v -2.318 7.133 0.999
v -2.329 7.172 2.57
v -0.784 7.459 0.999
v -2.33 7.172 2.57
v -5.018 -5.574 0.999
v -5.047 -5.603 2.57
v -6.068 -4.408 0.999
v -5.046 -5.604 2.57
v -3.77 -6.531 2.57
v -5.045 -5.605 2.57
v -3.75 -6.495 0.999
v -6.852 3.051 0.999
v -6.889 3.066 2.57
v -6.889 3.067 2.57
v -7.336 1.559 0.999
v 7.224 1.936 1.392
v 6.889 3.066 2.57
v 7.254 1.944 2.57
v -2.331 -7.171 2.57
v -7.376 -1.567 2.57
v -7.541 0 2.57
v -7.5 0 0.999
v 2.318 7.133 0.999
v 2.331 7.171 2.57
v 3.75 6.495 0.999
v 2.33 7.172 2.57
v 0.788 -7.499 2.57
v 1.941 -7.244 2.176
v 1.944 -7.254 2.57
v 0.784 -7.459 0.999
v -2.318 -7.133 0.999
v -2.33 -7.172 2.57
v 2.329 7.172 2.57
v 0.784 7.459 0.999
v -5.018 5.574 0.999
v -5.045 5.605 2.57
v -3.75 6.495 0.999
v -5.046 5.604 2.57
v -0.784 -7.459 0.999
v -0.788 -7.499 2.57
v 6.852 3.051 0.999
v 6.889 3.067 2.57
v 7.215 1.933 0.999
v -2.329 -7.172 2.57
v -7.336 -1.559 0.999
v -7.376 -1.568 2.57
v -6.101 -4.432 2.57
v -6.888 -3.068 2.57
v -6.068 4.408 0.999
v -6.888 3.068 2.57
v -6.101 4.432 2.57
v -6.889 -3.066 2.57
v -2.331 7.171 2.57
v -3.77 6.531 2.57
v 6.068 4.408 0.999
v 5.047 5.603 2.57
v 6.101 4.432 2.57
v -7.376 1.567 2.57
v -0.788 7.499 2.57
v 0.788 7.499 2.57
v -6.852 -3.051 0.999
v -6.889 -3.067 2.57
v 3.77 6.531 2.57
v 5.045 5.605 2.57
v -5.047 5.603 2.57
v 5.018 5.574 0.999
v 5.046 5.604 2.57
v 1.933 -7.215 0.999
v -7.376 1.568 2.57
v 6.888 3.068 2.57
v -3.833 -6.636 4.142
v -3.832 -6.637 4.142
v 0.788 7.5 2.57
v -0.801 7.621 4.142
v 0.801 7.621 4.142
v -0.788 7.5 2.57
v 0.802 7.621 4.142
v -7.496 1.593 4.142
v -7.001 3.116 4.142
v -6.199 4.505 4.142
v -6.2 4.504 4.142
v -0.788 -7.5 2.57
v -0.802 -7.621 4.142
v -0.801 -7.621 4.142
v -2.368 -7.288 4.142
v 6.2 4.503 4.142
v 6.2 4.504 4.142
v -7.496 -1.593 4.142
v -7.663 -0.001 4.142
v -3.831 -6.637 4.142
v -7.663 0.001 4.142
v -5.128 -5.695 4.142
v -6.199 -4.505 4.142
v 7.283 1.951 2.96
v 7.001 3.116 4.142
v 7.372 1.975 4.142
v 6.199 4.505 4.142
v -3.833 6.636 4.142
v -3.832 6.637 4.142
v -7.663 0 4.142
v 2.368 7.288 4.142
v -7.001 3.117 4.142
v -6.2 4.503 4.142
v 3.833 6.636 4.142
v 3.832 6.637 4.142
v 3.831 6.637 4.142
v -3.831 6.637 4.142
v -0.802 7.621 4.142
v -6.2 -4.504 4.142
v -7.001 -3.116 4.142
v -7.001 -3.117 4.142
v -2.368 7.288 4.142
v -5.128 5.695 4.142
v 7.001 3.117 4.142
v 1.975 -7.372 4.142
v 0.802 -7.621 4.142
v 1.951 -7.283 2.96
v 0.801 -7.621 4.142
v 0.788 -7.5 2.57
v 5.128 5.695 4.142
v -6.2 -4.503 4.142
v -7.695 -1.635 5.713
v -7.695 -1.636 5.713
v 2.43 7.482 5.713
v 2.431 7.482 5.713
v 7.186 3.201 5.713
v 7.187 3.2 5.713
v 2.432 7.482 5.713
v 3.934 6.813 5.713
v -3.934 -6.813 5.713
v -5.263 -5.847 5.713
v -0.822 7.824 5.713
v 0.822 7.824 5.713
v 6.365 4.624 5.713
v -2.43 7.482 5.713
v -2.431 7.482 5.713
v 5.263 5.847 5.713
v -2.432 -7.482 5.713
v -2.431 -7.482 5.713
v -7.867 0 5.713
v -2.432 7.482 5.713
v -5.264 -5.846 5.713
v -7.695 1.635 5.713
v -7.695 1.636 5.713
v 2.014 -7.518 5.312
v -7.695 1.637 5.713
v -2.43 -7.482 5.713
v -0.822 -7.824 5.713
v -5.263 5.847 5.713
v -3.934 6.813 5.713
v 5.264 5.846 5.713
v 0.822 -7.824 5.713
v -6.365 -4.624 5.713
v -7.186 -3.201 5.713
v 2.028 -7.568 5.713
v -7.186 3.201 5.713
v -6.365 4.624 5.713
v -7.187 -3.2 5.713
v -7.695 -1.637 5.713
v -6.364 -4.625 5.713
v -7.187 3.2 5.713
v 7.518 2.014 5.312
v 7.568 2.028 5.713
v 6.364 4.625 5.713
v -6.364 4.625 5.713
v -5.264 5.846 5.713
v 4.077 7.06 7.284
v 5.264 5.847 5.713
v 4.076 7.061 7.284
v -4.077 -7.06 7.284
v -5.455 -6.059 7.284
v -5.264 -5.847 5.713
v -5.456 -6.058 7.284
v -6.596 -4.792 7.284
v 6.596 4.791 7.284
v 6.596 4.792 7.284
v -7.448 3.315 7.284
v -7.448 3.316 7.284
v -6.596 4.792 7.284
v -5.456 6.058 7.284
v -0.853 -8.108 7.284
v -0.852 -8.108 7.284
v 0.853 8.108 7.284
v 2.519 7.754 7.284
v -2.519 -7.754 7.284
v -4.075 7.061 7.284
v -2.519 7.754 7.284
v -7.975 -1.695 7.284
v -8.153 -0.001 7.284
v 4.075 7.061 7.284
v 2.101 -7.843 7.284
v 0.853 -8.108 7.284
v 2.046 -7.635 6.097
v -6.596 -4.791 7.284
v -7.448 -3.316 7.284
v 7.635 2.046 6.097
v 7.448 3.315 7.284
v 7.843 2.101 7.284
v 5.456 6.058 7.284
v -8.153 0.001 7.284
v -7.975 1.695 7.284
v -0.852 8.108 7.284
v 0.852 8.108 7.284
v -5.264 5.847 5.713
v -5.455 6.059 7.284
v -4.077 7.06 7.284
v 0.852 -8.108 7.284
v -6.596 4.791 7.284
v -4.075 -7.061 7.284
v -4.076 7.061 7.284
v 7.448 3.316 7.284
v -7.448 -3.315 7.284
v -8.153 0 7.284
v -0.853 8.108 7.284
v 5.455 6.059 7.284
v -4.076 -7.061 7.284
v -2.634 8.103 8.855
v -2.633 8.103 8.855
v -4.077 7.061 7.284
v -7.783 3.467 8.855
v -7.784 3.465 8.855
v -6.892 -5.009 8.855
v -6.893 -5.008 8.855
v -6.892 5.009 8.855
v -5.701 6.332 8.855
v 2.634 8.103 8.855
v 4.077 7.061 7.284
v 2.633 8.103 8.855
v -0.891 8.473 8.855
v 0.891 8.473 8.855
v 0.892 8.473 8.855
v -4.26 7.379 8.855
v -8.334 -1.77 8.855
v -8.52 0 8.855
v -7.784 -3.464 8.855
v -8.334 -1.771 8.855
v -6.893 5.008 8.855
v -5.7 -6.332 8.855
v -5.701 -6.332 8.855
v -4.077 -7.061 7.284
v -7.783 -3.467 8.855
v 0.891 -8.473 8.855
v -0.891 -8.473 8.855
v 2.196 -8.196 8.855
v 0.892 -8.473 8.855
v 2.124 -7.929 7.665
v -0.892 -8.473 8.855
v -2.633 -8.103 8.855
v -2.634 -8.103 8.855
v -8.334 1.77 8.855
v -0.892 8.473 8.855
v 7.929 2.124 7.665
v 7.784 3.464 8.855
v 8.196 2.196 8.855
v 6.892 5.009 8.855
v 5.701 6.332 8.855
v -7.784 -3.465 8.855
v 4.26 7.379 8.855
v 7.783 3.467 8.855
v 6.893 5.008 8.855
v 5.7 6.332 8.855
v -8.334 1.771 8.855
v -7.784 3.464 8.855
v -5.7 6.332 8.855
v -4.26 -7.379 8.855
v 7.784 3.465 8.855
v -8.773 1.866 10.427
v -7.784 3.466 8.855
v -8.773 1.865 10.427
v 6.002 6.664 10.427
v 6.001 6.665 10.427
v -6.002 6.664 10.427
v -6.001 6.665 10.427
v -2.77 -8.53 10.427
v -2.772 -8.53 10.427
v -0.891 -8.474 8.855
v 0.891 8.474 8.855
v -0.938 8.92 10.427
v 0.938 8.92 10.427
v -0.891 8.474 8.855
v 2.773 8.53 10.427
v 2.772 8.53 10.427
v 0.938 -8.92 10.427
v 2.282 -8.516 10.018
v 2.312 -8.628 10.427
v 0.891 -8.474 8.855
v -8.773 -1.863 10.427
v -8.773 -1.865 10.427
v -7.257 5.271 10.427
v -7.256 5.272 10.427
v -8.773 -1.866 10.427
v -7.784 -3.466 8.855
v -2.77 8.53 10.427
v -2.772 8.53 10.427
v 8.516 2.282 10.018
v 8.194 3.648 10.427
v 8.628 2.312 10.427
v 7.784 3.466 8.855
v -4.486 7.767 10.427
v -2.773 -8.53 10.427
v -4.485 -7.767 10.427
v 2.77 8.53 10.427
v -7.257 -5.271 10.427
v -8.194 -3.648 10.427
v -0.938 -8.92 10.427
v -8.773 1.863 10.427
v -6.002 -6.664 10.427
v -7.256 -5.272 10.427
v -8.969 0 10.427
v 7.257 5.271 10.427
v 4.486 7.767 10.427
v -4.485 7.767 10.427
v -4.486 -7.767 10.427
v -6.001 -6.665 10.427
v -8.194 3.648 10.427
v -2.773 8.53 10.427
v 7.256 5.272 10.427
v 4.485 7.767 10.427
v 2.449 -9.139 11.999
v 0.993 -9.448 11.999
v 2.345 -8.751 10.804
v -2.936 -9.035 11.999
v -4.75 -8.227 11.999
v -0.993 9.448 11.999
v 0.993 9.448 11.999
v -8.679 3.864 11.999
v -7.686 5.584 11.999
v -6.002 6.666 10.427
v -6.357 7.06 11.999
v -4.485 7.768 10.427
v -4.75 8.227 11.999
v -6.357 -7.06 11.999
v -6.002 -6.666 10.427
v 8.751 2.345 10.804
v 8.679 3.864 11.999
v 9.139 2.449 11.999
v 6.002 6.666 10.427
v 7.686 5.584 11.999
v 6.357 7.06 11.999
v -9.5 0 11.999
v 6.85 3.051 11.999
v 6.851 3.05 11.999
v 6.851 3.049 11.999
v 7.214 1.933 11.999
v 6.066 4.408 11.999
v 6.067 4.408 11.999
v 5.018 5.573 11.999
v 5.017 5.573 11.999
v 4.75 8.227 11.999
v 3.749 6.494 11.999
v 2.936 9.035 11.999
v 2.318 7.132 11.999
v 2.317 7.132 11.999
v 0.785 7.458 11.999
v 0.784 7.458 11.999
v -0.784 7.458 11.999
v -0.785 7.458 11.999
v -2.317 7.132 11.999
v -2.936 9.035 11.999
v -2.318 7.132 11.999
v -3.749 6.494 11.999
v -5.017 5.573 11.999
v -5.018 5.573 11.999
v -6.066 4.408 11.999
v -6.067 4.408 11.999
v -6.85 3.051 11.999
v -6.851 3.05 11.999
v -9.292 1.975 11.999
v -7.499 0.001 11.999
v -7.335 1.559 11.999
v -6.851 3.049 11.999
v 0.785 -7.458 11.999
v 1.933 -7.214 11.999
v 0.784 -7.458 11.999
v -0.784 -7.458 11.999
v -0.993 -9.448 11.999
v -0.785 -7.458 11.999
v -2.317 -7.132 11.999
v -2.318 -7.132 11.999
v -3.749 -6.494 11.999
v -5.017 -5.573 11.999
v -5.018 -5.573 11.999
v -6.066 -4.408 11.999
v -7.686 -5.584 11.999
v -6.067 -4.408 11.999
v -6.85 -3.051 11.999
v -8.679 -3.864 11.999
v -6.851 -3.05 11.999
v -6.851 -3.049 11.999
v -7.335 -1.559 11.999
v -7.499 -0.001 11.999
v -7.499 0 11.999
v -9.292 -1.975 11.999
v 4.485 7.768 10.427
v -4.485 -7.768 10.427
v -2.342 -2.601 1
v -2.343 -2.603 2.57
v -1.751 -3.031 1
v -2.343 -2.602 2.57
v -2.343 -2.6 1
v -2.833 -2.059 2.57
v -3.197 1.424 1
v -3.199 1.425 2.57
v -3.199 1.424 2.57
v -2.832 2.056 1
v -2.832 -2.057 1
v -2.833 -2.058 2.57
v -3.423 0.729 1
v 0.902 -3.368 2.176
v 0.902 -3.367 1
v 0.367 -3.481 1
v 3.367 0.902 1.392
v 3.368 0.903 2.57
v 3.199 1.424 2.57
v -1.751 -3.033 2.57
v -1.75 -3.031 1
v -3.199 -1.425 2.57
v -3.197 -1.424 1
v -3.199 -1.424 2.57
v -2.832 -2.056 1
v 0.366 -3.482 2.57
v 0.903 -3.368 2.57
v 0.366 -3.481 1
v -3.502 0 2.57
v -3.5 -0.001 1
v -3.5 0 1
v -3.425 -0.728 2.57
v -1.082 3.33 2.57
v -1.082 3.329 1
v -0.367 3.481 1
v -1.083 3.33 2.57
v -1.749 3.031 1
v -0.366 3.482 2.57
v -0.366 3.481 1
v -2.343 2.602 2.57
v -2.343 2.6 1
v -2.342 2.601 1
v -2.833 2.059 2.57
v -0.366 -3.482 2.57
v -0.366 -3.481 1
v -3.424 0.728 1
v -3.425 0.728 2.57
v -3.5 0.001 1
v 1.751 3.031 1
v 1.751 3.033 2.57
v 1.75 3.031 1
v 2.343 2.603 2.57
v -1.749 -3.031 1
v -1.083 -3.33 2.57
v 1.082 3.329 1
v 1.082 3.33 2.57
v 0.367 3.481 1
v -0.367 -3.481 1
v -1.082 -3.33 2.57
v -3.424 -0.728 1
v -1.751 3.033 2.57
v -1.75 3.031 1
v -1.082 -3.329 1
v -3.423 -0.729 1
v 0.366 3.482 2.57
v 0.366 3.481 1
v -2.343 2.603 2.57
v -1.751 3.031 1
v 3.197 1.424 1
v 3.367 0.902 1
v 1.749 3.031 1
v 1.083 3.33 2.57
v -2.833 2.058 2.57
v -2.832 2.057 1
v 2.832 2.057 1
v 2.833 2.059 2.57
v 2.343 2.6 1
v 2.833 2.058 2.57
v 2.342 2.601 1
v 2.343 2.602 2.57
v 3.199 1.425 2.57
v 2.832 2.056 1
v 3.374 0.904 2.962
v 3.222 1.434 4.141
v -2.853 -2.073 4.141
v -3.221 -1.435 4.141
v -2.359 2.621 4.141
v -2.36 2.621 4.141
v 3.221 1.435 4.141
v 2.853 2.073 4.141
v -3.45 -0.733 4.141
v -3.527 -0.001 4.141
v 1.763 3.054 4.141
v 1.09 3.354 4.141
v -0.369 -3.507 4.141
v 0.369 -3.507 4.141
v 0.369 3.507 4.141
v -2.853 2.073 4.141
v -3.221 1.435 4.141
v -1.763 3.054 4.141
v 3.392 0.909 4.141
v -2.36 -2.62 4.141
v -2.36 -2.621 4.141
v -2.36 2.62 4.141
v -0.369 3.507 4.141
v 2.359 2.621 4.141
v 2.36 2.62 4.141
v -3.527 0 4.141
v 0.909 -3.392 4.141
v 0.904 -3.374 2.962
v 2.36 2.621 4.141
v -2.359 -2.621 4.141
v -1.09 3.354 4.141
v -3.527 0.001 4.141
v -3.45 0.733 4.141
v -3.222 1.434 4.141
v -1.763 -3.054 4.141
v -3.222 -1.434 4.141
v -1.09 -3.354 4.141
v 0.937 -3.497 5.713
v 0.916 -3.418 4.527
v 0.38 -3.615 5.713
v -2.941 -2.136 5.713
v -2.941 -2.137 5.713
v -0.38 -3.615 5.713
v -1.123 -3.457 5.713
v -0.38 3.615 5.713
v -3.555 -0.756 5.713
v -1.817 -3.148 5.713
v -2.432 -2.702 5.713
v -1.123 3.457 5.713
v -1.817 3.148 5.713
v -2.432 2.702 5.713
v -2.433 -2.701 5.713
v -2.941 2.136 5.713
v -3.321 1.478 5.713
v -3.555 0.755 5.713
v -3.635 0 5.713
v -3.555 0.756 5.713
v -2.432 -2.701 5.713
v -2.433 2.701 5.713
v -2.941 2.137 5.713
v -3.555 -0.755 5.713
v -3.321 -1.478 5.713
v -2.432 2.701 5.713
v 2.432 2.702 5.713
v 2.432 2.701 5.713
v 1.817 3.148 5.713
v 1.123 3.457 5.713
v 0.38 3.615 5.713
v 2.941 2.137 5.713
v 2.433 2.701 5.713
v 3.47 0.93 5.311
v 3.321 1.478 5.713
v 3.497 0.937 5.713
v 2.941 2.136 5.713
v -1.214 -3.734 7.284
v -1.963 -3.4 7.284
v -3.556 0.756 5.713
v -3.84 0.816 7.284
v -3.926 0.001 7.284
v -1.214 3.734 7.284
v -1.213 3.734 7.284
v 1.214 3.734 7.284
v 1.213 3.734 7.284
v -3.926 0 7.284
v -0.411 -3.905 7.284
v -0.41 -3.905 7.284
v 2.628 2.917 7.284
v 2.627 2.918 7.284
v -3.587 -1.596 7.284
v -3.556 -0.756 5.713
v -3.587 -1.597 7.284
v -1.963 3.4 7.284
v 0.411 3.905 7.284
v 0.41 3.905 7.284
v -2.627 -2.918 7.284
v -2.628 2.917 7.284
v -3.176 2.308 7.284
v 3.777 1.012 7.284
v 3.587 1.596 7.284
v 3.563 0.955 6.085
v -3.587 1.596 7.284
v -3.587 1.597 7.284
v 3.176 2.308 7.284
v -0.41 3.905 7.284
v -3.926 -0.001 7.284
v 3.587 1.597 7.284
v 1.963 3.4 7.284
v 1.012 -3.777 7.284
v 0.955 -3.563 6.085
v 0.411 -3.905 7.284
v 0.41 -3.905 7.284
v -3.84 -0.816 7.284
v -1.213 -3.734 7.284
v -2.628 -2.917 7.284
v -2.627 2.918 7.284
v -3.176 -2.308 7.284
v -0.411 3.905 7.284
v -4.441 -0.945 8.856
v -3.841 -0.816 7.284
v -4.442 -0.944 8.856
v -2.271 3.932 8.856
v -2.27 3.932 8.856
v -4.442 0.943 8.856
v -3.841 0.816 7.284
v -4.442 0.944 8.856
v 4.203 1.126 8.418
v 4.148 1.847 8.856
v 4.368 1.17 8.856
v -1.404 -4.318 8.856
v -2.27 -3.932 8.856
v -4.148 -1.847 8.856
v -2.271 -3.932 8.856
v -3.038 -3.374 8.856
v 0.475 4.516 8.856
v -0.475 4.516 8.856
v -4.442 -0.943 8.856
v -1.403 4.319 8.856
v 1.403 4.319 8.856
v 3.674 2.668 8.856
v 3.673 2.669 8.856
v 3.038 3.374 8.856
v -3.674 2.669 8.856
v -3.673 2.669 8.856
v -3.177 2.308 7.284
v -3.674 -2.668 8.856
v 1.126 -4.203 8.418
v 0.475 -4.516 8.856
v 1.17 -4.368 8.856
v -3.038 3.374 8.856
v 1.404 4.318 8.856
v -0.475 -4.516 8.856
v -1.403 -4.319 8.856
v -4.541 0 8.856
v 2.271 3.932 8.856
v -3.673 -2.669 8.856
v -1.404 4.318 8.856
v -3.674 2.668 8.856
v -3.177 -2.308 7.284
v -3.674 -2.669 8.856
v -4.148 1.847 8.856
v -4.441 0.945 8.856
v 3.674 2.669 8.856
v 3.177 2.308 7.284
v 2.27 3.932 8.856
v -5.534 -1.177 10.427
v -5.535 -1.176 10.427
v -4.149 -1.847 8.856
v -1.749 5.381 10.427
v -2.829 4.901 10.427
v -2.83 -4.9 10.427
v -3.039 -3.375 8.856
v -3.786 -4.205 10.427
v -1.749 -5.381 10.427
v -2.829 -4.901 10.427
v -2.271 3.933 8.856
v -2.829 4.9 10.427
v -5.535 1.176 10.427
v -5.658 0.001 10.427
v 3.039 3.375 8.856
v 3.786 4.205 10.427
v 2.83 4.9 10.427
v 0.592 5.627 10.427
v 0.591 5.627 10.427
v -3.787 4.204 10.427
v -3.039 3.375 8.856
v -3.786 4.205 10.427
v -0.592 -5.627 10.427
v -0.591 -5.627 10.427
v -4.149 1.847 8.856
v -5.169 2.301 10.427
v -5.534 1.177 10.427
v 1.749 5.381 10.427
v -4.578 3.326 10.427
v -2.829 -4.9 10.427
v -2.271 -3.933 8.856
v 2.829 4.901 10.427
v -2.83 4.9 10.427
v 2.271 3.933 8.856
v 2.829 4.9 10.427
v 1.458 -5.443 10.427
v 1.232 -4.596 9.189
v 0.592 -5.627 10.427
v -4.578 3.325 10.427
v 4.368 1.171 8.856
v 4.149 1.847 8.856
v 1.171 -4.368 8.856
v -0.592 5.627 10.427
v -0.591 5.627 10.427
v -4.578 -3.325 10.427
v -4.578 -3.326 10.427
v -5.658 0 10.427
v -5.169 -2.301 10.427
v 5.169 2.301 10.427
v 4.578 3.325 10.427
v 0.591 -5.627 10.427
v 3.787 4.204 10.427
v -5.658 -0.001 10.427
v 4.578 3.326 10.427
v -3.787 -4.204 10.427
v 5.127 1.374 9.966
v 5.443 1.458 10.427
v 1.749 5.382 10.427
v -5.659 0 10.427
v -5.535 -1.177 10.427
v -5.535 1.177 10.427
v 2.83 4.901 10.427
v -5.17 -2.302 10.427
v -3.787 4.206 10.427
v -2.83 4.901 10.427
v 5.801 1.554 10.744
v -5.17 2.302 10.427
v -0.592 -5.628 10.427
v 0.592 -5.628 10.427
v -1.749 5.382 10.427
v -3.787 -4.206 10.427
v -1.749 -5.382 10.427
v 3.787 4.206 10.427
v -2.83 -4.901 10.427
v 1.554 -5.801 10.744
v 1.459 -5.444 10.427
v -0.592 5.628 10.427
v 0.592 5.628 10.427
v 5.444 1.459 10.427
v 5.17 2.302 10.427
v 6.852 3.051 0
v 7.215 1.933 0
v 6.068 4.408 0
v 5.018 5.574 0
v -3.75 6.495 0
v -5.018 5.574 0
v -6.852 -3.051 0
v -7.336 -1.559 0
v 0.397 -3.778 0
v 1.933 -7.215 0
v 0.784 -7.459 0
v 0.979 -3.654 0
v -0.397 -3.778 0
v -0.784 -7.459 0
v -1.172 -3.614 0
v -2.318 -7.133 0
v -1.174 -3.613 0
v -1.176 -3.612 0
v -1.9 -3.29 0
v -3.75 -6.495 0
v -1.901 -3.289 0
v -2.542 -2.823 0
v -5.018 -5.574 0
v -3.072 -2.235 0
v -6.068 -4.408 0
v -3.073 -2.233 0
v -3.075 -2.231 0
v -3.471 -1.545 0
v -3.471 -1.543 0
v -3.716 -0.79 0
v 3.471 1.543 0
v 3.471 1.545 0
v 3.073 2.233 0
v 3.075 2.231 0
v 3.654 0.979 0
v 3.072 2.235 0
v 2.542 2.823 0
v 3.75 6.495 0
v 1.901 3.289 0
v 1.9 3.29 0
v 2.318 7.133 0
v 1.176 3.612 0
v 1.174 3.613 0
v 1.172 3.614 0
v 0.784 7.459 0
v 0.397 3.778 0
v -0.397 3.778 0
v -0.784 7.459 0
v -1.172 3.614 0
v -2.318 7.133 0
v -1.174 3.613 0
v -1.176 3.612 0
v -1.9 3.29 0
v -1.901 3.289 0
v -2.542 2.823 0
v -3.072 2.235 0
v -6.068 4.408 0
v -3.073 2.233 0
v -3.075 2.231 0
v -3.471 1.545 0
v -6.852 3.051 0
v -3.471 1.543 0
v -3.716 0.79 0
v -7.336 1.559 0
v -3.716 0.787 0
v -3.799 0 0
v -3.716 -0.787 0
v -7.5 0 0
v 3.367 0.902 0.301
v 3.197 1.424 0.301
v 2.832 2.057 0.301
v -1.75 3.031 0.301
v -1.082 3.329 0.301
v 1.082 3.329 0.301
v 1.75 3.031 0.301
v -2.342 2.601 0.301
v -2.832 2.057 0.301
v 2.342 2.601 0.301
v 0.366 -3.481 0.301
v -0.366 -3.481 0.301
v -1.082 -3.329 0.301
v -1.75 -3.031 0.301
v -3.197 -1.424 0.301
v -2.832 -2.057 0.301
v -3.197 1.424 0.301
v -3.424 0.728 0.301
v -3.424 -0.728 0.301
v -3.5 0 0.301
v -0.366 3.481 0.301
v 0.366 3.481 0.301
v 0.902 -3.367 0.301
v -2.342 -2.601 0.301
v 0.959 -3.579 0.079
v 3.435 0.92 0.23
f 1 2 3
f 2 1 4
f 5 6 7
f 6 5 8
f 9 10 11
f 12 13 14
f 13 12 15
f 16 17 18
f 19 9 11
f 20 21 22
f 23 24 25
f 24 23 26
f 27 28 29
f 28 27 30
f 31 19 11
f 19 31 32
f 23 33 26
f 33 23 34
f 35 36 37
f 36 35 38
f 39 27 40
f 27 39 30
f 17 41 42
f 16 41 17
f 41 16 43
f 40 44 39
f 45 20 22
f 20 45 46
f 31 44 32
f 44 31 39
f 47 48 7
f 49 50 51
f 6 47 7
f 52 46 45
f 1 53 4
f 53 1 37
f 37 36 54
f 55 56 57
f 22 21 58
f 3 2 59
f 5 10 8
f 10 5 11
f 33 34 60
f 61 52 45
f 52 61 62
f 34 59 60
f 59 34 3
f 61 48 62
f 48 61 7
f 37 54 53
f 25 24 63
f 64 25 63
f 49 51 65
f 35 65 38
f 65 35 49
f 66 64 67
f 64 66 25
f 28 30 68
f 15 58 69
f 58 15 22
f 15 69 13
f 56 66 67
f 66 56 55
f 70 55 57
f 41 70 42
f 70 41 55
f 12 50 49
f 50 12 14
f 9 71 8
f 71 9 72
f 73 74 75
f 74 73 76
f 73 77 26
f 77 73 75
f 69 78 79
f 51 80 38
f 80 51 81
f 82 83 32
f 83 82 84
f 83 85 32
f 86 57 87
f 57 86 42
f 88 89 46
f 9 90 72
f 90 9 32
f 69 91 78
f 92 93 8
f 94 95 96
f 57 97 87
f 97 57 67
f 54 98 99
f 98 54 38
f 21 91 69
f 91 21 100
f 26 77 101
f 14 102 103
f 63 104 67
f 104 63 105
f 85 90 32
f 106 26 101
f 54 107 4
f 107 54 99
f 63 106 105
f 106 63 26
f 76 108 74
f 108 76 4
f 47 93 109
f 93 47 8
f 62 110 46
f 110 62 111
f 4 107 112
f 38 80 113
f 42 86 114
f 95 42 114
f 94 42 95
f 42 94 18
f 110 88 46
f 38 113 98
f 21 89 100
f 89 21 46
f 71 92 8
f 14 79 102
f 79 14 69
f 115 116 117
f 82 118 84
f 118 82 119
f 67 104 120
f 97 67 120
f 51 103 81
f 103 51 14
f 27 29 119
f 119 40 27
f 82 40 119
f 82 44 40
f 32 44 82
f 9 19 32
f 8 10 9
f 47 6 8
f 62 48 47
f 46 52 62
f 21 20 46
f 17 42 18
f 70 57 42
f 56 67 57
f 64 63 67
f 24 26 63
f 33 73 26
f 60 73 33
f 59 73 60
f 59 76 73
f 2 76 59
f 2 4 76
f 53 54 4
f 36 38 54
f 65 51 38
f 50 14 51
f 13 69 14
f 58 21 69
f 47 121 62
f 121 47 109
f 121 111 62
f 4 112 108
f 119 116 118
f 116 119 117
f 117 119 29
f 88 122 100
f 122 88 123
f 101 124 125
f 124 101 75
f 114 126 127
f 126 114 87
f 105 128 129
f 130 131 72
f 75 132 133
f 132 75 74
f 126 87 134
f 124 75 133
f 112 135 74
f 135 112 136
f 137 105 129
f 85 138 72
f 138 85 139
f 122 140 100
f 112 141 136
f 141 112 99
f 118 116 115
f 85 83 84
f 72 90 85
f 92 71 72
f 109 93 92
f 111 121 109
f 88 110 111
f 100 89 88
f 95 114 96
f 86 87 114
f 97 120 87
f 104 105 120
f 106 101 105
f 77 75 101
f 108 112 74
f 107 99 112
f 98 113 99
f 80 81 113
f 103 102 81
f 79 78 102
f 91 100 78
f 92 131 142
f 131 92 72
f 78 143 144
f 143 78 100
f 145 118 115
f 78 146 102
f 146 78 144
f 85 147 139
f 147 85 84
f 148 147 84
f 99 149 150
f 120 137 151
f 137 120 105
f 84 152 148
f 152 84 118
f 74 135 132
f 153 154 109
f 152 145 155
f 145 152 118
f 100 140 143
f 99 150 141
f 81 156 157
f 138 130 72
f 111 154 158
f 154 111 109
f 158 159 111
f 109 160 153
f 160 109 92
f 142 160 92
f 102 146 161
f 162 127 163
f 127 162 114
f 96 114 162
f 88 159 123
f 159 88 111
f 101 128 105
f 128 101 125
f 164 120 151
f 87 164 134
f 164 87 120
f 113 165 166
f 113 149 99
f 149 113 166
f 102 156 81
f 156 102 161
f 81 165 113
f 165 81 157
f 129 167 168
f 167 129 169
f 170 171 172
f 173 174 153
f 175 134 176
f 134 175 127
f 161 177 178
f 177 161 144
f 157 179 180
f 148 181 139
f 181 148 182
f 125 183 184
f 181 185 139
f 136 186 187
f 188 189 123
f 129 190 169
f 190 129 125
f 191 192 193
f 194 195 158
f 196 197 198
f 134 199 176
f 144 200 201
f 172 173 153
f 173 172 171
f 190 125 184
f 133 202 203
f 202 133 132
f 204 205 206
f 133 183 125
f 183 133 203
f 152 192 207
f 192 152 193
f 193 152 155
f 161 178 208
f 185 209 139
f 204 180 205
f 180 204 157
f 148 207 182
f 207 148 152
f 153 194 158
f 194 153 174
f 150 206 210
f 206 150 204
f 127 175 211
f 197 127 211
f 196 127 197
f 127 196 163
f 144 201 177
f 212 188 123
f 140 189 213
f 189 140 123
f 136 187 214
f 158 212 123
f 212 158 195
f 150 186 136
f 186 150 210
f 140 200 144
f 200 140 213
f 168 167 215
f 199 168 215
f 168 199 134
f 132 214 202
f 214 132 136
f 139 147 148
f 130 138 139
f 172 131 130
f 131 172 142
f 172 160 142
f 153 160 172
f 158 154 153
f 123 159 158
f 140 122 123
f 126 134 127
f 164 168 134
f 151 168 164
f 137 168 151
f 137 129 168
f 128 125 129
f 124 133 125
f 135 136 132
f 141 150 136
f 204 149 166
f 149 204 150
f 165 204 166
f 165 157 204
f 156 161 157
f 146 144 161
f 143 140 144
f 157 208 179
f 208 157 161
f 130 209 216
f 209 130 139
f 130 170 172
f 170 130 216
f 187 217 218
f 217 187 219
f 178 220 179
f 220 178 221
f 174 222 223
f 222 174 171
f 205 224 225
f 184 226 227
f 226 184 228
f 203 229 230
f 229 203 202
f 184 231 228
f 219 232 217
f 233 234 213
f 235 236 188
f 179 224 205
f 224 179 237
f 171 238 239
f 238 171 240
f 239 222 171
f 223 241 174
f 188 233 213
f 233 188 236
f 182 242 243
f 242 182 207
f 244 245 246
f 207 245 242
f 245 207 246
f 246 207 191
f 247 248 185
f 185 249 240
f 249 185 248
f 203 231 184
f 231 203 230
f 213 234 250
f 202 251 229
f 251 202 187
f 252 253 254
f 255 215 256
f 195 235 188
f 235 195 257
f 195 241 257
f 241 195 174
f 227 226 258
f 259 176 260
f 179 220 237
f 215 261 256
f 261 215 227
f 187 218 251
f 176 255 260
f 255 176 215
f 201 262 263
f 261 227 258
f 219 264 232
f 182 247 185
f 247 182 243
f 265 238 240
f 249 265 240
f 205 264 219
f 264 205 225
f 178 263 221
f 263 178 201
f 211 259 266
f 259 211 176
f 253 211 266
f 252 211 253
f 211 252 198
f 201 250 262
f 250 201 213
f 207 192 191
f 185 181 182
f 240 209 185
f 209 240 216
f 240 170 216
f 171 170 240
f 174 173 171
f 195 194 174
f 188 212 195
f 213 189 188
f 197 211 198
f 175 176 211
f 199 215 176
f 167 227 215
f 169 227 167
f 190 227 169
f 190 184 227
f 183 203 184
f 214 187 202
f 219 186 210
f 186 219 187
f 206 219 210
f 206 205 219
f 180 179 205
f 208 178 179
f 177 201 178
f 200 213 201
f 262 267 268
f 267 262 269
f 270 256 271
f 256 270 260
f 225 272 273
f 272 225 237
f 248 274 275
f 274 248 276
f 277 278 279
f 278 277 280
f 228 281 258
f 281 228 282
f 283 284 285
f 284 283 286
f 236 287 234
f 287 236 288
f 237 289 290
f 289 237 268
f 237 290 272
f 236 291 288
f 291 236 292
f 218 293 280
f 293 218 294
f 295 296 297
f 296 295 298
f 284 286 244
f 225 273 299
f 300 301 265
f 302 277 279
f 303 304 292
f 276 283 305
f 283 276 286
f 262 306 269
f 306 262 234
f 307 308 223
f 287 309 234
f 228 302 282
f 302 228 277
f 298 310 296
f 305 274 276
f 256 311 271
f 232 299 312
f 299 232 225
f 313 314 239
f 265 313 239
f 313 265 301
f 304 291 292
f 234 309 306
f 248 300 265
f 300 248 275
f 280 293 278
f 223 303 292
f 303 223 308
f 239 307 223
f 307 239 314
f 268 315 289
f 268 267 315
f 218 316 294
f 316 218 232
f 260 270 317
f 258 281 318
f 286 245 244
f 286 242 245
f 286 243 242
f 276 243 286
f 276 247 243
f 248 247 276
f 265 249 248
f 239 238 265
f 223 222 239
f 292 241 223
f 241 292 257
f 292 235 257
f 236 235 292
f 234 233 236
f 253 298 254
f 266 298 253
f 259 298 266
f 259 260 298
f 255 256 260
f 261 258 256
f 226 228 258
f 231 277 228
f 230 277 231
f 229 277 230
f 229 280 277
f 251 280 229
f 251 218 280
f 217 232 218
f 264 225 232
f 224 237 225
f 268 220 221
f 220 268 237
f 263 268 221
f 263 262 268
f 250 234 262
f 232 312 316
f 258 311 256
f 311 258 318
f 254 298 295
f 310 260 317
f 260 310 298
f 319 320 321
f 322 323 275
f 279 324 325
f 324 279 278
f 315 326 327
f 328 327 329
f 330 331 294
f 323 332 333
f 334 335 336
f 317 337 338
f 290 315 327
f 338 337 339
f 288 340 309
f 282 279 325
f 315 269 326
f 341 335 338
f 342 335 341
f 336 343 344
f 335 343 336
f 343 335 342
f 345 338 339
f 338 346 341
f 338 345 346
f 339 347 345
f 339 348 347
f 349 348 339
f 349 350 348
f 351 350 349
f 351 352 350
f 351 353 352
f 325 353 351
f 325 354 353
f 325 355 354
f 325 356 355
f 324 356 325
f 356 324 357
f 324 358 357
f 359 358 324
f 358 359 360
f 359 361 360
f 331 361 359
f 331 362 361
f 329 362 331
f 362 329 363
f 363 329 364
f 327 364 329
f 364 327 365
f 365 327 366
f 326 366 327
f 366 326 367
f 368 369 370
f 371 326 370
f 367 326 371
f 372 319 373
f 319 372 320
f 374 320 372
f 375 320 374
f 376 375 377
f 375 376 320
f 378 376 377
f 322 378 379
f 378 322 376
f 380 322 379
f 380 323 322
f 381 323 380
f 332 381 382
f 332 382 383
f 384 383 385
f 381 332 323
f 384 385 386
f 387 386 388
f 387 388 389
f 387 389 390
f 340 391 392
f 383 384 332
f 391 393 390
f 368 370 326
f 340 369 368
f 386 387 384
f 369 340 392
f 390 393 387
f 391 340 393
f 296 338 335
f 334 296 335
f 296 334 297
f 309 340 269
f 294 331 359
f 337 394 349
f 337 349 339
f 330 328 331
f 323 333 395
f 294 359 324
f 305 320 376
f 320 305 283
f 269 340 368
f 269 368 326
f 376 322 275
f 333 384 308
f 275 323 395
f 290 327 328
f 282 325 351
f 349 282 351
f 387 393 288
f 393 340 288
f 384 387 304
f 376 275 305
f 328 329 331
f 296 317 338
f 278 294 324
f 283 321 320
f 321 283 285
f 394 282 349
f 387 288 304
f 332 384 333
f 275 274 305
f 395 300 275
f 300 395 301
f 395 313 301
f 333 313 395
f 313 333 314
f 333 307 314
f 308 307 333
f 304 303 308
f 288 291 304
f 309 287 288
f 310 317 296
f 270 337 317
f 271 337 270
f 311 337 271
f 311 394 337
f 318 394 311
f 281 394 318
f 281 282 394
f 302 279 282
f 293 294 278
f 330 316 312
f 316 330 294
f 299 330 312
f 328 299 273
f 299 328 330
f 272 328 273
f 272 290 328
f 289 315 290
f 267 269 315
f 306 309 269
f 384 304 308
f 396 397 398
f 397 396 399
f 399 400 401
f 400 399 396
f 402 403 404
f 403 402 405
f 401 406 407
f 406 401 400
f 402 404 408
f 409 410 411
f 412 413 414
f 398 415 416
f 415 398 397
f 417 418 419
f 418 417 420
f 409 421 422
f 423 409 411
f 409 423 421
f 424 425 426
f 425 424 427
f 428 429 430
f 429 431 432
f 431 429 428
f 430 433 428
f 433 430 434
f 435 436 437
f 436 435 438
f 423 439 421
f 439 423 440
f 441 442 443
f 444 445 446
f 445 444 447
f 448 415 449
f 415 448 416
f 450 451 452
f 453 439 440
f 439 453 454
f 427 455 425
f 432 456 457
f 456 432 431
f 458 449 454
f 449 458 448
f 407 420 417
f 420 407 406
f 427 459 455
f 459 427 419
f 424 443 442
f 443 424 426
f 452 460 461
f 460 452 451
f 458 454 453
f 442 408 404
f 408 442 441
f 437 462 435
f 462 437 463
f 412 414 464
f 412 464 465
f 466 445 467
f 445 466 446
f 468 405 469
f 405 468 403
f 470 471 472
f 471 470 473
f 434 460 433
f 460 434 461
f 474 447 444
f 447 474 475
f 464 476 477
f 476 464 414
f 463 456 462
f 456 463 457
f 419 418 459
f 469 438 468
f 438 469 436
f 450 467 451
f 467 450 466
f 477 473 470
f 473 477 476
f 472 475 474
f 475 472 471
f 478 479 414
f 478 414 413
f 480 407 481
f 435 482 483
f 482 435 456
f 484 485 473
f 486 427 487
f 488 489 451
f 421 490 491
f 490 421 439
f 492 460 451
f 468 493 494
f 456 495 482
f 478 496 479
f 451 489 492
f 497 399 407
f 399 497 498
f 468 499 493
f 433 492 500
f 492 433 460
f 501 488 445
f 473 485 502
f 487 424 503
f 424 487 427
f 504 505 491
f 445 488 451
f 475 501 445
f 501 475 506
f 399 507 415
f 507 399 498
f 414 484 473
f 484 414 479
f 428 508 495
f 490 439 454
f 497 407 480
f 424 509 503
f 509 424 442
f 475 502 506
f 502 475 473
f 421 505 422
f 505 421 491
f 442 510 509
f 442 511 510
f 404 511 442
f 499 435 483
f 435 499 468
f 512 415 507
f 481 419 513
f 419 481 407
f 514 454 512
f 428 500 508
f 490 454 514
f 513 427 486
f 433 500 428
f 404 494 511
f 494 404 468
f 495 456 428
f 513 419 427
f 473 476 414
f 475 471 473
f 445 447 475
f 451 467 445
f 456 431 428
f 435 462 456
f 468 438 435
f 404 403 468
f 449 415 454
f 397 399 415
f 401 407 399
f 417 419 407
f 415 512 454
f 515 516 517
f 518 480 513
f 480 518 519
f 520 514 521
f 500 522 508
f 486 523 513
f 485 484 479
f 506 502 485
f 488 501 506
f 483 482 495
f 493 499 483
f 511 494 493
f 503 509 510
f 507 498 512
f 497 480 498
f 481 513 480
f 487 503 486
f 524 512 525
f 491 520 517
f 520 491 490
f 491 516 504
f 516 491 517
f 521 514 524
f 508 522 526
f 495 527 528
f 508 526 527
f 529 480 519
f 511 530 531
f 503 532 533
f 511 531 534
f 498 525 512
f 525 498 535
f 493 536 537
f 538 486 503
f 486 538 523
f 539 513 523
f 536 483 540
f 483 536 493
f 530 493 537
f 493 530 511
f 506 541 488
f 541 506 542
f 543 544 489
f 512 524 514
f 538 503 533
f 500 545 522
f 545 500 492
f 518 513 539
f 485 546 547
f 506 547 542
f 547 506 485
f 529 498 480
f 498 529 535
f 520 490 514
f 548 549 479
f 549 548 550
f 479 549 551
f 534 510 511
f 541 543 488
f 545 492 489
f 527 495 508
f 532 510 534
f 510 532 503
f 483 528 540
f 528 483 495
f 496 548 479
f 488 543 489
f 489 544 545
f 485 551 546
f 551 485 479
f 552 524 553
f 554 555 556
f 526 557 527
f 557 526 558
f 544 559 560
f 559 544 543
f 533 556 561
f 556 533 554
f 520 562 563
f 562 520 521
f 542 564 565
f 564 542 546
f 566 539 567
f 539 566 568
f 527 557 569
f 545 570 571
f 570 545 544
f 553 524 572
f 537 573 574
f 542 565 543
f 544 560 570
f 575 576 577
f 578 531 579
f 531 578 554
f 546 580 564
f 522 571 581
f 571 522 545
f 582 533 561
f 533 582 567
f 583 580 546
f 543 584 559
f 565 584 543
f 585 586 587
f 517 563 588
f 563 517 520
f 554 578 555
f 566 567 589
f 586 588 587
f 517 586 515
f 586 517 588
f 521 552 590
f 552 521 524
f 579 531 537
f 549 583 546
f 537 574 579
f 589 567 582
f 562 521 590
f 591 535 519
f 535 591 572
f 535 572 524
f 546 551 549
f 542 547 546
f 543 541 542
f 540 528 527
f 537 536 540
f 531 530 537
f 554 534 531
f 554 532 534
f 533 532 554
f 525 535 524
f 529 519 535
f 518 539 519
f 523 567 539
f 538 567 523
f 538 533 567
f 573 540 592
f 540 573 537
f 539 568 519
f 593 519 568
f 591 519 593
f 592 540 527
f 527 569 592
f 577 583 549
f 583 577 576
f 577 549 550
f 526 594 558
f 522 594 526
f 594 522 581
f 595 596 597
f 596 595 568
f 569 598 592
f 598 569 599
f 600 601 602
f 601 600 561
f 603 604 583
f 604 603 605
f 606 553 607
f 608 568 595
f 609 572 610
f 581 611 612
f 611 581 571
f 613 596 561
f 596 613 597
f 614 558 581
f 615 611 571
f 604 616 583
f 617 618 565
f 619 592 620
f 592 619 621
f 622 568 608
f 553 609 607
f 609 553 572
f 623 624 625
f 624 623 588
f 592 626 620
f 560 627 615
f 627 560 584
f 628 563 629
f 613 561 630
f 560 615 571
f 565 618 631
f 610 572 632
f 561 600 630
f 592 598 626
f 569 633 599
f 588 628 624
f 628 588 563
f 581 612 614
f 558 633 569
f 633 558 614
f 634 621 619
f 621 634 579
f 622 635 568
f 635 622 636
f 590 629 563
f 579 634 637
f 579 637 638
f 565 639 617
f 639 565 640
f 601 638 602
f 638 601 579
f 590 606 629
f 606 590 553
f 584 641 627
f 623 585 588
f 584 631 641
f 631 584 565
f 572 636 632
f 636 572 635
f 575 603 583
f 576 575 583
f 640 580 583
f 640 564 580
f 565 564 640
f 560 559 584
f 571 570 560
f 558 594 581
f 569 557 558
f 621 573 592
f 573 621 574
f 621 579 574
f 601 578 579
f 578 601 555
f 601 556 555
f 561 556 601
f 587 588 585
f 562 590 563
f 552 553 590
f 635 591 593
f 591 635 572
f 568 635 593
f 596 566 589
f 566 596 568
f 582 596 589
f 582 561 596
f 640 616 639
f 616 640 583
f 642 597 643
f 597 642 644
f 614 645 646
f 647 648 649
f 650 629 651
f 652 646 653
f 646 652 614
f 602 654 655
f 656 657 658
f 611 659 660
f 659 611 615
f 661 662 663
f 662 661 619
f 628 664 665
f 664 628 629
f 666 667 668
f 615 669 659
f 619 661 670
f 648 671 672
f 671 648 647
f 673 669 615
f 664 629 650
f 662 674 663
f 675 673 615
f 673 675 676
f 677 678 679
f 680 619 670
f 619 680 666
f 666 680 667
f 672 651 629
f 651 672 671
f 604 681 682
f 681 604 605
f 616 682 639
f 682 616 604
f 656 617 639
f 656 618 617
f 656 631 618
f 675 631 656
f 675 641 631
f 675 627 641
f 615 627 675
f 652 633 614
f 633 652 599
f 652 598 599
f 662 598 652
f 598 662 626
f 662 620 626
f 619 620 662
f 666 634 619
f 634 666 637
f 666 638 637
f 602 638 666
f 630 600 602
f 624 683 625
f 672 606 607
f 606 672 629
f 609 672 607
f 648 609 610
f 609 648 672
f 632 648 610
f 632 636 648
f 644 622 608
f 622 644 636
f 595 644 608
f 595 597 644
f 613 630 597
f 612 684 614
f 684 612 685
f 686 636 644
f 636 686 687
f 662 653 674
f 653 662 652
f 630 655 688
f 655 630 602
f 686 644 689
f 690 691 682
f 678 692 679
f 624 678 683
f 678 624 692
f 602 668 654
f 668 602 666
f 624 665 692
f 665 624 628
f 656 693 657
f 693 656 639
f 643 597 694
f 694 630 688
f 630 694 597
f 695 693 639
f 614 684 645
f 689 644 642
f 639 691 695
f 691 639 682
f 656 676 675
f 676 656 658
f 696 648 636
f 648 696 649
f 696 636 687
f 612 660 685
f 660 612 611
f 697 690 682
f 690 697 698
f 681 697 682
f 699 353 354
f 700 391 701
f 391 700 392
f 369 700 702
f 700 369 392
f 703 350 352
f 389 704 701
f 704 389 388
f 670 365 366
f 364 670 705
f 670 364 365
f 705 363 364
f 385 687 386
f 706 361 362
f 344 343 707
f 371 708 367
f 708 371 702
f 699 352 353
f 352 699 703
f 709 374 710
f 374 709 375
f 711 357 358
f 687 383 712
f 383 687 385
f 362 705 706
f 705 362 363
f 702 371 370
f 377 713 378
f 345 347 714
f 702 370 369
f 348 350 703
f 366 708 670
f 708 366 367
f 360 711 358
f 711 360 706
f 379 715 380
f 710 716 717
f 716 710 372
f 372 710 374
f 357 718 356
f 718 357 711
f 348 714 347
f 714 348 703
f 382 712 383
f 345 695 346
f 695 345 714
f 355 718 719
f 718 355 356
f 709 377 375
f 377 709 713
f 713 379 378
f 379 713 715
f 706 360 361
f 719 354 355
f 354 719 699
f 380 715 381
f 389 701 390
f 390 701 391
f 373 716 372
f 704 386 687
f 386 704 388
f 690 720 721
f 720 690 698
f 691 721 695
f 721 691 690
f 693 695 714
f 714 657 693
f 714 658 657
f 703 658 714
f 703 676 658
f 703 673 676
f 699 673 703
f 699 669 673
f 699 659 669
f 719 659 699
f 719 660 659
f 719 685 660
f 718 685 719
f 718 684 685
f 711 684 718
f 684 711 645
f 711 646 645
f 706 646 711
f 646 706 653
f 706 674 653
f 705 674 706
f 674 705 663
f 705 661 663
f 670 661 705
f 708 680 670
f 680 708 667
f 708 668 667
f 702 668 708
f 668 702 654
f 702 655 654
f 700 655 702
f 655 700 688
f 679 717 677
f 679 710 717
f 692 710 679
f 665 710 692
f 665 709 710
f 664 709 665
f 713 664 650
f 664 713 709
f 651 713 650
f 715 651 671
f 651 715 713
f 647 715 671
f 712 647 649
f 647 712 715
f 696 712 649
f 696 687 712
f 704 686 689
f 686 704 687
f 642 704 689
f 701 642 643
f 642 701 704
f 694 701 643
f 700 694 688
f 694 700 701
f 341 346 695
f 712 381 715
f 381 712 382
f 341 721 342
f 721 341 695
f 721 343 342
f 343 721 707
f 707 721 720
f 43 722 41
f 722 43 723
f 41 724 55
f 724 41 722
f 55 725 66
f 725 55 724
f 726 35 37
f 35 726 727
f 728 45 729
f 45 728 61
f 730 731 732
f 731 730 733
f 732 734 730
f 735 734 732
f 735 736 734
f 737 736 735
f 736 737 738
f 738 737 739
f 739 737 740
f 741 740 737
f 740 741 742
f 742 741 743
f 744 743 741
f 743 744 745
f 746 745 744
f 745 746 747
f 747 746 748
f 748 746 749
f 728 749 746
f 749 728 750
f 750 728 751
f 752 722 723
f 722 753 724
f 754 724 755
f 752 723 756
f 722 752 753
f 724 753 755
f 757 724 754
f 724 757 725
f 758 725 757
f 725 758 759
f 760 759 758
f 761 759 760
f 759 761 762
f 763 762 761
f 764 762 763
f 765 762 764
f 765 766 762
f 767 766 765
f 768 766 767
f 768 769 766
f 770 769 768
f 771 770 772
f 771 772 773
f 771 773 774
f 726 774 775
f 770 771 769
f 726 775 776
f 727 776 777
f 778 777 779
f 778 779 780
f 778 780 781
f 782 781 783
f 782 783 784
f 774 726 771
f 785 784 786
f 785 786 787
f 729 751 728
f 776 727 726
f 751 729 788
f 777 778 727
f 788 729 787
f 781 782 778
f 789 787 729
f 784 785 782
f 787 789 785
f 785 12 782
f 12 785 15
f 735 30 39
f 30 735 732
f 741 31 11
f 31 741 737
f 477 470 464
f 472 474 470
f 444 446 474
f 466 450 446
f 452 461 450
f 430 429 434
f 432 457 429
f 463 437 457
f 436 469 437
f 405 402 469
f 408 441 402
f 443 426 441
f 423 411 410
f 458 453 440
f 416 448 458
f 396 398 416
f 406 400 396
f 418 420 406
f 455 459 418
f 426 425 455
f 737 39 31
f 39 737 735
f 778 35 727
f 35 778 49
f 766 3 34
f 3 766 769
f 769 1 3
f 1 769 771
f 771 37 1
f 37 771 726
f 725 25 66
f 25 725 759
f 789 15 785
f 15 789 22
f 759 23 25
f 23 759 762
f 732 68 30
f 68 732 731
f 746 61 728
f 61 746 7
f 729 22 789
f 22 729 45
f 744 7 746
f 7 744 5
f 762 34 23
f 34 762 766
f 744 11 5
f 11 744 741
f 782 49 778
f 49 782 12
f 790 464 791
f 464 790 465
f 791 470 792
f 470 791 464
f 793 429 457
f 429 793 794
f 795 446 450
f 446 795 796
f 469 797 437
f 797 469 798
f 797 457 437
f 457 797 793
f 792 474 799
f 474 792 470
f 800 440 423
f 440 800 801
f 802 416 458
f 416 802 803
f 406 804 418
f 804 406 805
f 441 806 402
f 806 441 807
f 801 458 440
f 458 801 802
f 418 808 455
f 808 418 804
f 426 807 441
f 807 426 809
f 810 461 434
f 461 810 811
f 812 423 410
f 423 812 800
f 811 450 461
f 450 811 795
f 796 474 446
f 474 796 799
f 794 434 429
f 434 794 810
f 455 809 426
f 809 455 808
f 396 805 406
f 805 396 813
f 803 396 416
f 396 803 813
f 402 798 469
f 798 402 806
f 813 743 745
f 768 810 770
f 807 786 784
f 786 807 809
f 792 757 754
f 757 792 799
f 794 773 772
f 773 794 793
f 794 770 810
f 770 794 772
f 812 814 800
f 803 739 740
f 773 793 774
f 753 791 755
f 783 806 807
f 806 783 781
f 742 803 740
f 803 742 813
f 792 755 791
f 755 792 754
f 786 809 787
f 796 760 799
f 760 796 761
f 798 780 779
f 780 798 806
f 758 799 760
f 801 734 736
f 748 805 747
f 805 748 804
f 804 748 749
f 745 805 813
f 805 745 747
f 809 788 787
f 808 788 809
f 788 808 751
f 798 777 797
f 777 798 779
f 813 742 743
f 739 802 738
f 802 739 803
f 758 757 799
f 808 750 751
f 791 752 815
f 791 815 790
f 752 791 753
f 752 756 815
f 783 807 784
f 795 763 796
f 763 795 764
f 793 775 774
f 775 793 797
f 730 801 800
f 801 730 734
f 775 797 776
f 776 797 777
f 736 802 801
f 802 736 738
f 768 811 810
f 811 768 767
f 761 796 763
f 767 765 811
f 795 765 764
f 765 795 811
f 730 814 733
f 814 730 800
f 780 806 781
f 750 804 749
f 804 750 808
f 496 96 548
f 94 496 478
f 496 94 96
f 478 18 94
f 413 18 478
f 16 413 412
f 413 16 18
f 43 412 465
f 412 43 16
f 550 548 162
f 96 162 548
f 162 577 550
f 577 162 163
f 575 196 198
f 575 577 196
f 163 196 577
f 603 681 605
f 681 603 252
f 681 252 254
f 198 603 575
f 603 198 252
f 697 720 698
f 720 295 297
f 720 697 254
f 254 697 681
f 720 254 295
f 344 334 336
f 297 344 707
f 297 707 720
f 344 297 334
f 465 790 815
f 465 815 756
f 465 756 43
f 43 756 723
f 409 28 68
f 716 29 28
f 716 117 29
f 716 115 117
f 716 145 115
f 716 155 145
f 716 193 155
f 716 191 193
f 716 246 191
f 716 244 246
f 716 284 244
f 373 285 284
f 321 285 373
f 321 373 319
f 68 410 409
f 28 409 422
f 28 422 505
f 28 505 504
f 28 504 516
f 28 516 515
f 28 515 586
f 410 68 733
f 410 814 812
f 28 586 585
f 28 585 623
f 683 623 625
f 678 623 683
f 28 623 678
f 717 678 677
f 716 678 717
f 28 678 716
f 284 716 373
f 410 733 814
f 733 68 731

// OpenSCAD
// Mode. Use "printing" for actual printing.
mode = "design";  // [design, printing]

// Diameter at the bottom of the funnel. Tweak for good tube fit.
bottom_hole_diameter = 7;

// Controls the inner shape of the hold.
k1 = 4;

// Controls the outer shape of the funnel.
k2 = 2;

// Diameter at the top of the funnel.
top_hole_diameter = 11;

// Wall thickness at bottom of funnel
bottom_wall = 4;

// Wall thickness at top of funnel.
top_wall = 3;

// Height of a cylindrical extension at the bottom.
straight_height = 1;

// Height of the funnel part.
funnel_height = 11;

// Hole chamfer at the bottom.
chamfer = 0.3;

/* [ Hidden ] */
eps1 = 0.001;
eps2 = 2*eps1;

module solid_funnel(d1, d2, h, k, n) {
  h0 = h - eps1;
  for (i =[0:n-1]) {
    //echo(i);
    h_1 = h0 * i / n; 
    h_2 = h0 * (i+1) / n;

    offset_1 = (d2 - d1) * pow(h_1,k)/pow(h0,k);
    offset_2 = (d2 - d1) * pow(h_2,k)/pow(h0,k);

    d_1 = d1 + 2*offset_1;
    d_2 = d1 + 2*offset_2;
    // Extending vertically by eps1 to maintain manifold with next slice.
    translate([0, 0, h_1]) cylinder(d1=d_1, d2=d_2, h=eps1+h/n); 
  }
}

module hollow_funnel(od1, od2, id1, id2, h, k1, k2) {
  difference() {
    solid_funnel(od1, od2, h, k2, floor($fn/4));
    translate([0, 0, -eps1]) solid_funnel(id1, id2, h+eps2, k1, floor($fn/4));
  }
}

module main() {
  // Funnel
  translate([0, 0, straight_height-eps1]) hollow_funnel(bottom_hole_diameter+2*bottom_wall, top_hole_diameter+2*top_wall, bottom_hole_diameter, top_hole_diameter, funnel_height, k1, k2);

  // Hollow tube extension at the bottom.
  difference() {
    cylinder(d=bottom_hole_diameter+2*bottom_wall, h=straight_height);  
    translate([0, 0, -eps1]) cylinder(d=bottom_hole_diameter, h=straight_height+eps2);  
    translate([0, 0, -eps1]) cylinder(d1=bottom_hole_diameter+2*chamfer, d2=bottom_hole_diameter, h=chamfer+eps2);
  }
}

if (mode == "design") {
  $fn=30;
  render(convexity = 2) difference() {
    main();
    rotate([0, 0, -75]) translate([0, 0, -eps1]) cube([100, 100, 100]);
  }
} else {
  $fn=90;
  main();  
}
